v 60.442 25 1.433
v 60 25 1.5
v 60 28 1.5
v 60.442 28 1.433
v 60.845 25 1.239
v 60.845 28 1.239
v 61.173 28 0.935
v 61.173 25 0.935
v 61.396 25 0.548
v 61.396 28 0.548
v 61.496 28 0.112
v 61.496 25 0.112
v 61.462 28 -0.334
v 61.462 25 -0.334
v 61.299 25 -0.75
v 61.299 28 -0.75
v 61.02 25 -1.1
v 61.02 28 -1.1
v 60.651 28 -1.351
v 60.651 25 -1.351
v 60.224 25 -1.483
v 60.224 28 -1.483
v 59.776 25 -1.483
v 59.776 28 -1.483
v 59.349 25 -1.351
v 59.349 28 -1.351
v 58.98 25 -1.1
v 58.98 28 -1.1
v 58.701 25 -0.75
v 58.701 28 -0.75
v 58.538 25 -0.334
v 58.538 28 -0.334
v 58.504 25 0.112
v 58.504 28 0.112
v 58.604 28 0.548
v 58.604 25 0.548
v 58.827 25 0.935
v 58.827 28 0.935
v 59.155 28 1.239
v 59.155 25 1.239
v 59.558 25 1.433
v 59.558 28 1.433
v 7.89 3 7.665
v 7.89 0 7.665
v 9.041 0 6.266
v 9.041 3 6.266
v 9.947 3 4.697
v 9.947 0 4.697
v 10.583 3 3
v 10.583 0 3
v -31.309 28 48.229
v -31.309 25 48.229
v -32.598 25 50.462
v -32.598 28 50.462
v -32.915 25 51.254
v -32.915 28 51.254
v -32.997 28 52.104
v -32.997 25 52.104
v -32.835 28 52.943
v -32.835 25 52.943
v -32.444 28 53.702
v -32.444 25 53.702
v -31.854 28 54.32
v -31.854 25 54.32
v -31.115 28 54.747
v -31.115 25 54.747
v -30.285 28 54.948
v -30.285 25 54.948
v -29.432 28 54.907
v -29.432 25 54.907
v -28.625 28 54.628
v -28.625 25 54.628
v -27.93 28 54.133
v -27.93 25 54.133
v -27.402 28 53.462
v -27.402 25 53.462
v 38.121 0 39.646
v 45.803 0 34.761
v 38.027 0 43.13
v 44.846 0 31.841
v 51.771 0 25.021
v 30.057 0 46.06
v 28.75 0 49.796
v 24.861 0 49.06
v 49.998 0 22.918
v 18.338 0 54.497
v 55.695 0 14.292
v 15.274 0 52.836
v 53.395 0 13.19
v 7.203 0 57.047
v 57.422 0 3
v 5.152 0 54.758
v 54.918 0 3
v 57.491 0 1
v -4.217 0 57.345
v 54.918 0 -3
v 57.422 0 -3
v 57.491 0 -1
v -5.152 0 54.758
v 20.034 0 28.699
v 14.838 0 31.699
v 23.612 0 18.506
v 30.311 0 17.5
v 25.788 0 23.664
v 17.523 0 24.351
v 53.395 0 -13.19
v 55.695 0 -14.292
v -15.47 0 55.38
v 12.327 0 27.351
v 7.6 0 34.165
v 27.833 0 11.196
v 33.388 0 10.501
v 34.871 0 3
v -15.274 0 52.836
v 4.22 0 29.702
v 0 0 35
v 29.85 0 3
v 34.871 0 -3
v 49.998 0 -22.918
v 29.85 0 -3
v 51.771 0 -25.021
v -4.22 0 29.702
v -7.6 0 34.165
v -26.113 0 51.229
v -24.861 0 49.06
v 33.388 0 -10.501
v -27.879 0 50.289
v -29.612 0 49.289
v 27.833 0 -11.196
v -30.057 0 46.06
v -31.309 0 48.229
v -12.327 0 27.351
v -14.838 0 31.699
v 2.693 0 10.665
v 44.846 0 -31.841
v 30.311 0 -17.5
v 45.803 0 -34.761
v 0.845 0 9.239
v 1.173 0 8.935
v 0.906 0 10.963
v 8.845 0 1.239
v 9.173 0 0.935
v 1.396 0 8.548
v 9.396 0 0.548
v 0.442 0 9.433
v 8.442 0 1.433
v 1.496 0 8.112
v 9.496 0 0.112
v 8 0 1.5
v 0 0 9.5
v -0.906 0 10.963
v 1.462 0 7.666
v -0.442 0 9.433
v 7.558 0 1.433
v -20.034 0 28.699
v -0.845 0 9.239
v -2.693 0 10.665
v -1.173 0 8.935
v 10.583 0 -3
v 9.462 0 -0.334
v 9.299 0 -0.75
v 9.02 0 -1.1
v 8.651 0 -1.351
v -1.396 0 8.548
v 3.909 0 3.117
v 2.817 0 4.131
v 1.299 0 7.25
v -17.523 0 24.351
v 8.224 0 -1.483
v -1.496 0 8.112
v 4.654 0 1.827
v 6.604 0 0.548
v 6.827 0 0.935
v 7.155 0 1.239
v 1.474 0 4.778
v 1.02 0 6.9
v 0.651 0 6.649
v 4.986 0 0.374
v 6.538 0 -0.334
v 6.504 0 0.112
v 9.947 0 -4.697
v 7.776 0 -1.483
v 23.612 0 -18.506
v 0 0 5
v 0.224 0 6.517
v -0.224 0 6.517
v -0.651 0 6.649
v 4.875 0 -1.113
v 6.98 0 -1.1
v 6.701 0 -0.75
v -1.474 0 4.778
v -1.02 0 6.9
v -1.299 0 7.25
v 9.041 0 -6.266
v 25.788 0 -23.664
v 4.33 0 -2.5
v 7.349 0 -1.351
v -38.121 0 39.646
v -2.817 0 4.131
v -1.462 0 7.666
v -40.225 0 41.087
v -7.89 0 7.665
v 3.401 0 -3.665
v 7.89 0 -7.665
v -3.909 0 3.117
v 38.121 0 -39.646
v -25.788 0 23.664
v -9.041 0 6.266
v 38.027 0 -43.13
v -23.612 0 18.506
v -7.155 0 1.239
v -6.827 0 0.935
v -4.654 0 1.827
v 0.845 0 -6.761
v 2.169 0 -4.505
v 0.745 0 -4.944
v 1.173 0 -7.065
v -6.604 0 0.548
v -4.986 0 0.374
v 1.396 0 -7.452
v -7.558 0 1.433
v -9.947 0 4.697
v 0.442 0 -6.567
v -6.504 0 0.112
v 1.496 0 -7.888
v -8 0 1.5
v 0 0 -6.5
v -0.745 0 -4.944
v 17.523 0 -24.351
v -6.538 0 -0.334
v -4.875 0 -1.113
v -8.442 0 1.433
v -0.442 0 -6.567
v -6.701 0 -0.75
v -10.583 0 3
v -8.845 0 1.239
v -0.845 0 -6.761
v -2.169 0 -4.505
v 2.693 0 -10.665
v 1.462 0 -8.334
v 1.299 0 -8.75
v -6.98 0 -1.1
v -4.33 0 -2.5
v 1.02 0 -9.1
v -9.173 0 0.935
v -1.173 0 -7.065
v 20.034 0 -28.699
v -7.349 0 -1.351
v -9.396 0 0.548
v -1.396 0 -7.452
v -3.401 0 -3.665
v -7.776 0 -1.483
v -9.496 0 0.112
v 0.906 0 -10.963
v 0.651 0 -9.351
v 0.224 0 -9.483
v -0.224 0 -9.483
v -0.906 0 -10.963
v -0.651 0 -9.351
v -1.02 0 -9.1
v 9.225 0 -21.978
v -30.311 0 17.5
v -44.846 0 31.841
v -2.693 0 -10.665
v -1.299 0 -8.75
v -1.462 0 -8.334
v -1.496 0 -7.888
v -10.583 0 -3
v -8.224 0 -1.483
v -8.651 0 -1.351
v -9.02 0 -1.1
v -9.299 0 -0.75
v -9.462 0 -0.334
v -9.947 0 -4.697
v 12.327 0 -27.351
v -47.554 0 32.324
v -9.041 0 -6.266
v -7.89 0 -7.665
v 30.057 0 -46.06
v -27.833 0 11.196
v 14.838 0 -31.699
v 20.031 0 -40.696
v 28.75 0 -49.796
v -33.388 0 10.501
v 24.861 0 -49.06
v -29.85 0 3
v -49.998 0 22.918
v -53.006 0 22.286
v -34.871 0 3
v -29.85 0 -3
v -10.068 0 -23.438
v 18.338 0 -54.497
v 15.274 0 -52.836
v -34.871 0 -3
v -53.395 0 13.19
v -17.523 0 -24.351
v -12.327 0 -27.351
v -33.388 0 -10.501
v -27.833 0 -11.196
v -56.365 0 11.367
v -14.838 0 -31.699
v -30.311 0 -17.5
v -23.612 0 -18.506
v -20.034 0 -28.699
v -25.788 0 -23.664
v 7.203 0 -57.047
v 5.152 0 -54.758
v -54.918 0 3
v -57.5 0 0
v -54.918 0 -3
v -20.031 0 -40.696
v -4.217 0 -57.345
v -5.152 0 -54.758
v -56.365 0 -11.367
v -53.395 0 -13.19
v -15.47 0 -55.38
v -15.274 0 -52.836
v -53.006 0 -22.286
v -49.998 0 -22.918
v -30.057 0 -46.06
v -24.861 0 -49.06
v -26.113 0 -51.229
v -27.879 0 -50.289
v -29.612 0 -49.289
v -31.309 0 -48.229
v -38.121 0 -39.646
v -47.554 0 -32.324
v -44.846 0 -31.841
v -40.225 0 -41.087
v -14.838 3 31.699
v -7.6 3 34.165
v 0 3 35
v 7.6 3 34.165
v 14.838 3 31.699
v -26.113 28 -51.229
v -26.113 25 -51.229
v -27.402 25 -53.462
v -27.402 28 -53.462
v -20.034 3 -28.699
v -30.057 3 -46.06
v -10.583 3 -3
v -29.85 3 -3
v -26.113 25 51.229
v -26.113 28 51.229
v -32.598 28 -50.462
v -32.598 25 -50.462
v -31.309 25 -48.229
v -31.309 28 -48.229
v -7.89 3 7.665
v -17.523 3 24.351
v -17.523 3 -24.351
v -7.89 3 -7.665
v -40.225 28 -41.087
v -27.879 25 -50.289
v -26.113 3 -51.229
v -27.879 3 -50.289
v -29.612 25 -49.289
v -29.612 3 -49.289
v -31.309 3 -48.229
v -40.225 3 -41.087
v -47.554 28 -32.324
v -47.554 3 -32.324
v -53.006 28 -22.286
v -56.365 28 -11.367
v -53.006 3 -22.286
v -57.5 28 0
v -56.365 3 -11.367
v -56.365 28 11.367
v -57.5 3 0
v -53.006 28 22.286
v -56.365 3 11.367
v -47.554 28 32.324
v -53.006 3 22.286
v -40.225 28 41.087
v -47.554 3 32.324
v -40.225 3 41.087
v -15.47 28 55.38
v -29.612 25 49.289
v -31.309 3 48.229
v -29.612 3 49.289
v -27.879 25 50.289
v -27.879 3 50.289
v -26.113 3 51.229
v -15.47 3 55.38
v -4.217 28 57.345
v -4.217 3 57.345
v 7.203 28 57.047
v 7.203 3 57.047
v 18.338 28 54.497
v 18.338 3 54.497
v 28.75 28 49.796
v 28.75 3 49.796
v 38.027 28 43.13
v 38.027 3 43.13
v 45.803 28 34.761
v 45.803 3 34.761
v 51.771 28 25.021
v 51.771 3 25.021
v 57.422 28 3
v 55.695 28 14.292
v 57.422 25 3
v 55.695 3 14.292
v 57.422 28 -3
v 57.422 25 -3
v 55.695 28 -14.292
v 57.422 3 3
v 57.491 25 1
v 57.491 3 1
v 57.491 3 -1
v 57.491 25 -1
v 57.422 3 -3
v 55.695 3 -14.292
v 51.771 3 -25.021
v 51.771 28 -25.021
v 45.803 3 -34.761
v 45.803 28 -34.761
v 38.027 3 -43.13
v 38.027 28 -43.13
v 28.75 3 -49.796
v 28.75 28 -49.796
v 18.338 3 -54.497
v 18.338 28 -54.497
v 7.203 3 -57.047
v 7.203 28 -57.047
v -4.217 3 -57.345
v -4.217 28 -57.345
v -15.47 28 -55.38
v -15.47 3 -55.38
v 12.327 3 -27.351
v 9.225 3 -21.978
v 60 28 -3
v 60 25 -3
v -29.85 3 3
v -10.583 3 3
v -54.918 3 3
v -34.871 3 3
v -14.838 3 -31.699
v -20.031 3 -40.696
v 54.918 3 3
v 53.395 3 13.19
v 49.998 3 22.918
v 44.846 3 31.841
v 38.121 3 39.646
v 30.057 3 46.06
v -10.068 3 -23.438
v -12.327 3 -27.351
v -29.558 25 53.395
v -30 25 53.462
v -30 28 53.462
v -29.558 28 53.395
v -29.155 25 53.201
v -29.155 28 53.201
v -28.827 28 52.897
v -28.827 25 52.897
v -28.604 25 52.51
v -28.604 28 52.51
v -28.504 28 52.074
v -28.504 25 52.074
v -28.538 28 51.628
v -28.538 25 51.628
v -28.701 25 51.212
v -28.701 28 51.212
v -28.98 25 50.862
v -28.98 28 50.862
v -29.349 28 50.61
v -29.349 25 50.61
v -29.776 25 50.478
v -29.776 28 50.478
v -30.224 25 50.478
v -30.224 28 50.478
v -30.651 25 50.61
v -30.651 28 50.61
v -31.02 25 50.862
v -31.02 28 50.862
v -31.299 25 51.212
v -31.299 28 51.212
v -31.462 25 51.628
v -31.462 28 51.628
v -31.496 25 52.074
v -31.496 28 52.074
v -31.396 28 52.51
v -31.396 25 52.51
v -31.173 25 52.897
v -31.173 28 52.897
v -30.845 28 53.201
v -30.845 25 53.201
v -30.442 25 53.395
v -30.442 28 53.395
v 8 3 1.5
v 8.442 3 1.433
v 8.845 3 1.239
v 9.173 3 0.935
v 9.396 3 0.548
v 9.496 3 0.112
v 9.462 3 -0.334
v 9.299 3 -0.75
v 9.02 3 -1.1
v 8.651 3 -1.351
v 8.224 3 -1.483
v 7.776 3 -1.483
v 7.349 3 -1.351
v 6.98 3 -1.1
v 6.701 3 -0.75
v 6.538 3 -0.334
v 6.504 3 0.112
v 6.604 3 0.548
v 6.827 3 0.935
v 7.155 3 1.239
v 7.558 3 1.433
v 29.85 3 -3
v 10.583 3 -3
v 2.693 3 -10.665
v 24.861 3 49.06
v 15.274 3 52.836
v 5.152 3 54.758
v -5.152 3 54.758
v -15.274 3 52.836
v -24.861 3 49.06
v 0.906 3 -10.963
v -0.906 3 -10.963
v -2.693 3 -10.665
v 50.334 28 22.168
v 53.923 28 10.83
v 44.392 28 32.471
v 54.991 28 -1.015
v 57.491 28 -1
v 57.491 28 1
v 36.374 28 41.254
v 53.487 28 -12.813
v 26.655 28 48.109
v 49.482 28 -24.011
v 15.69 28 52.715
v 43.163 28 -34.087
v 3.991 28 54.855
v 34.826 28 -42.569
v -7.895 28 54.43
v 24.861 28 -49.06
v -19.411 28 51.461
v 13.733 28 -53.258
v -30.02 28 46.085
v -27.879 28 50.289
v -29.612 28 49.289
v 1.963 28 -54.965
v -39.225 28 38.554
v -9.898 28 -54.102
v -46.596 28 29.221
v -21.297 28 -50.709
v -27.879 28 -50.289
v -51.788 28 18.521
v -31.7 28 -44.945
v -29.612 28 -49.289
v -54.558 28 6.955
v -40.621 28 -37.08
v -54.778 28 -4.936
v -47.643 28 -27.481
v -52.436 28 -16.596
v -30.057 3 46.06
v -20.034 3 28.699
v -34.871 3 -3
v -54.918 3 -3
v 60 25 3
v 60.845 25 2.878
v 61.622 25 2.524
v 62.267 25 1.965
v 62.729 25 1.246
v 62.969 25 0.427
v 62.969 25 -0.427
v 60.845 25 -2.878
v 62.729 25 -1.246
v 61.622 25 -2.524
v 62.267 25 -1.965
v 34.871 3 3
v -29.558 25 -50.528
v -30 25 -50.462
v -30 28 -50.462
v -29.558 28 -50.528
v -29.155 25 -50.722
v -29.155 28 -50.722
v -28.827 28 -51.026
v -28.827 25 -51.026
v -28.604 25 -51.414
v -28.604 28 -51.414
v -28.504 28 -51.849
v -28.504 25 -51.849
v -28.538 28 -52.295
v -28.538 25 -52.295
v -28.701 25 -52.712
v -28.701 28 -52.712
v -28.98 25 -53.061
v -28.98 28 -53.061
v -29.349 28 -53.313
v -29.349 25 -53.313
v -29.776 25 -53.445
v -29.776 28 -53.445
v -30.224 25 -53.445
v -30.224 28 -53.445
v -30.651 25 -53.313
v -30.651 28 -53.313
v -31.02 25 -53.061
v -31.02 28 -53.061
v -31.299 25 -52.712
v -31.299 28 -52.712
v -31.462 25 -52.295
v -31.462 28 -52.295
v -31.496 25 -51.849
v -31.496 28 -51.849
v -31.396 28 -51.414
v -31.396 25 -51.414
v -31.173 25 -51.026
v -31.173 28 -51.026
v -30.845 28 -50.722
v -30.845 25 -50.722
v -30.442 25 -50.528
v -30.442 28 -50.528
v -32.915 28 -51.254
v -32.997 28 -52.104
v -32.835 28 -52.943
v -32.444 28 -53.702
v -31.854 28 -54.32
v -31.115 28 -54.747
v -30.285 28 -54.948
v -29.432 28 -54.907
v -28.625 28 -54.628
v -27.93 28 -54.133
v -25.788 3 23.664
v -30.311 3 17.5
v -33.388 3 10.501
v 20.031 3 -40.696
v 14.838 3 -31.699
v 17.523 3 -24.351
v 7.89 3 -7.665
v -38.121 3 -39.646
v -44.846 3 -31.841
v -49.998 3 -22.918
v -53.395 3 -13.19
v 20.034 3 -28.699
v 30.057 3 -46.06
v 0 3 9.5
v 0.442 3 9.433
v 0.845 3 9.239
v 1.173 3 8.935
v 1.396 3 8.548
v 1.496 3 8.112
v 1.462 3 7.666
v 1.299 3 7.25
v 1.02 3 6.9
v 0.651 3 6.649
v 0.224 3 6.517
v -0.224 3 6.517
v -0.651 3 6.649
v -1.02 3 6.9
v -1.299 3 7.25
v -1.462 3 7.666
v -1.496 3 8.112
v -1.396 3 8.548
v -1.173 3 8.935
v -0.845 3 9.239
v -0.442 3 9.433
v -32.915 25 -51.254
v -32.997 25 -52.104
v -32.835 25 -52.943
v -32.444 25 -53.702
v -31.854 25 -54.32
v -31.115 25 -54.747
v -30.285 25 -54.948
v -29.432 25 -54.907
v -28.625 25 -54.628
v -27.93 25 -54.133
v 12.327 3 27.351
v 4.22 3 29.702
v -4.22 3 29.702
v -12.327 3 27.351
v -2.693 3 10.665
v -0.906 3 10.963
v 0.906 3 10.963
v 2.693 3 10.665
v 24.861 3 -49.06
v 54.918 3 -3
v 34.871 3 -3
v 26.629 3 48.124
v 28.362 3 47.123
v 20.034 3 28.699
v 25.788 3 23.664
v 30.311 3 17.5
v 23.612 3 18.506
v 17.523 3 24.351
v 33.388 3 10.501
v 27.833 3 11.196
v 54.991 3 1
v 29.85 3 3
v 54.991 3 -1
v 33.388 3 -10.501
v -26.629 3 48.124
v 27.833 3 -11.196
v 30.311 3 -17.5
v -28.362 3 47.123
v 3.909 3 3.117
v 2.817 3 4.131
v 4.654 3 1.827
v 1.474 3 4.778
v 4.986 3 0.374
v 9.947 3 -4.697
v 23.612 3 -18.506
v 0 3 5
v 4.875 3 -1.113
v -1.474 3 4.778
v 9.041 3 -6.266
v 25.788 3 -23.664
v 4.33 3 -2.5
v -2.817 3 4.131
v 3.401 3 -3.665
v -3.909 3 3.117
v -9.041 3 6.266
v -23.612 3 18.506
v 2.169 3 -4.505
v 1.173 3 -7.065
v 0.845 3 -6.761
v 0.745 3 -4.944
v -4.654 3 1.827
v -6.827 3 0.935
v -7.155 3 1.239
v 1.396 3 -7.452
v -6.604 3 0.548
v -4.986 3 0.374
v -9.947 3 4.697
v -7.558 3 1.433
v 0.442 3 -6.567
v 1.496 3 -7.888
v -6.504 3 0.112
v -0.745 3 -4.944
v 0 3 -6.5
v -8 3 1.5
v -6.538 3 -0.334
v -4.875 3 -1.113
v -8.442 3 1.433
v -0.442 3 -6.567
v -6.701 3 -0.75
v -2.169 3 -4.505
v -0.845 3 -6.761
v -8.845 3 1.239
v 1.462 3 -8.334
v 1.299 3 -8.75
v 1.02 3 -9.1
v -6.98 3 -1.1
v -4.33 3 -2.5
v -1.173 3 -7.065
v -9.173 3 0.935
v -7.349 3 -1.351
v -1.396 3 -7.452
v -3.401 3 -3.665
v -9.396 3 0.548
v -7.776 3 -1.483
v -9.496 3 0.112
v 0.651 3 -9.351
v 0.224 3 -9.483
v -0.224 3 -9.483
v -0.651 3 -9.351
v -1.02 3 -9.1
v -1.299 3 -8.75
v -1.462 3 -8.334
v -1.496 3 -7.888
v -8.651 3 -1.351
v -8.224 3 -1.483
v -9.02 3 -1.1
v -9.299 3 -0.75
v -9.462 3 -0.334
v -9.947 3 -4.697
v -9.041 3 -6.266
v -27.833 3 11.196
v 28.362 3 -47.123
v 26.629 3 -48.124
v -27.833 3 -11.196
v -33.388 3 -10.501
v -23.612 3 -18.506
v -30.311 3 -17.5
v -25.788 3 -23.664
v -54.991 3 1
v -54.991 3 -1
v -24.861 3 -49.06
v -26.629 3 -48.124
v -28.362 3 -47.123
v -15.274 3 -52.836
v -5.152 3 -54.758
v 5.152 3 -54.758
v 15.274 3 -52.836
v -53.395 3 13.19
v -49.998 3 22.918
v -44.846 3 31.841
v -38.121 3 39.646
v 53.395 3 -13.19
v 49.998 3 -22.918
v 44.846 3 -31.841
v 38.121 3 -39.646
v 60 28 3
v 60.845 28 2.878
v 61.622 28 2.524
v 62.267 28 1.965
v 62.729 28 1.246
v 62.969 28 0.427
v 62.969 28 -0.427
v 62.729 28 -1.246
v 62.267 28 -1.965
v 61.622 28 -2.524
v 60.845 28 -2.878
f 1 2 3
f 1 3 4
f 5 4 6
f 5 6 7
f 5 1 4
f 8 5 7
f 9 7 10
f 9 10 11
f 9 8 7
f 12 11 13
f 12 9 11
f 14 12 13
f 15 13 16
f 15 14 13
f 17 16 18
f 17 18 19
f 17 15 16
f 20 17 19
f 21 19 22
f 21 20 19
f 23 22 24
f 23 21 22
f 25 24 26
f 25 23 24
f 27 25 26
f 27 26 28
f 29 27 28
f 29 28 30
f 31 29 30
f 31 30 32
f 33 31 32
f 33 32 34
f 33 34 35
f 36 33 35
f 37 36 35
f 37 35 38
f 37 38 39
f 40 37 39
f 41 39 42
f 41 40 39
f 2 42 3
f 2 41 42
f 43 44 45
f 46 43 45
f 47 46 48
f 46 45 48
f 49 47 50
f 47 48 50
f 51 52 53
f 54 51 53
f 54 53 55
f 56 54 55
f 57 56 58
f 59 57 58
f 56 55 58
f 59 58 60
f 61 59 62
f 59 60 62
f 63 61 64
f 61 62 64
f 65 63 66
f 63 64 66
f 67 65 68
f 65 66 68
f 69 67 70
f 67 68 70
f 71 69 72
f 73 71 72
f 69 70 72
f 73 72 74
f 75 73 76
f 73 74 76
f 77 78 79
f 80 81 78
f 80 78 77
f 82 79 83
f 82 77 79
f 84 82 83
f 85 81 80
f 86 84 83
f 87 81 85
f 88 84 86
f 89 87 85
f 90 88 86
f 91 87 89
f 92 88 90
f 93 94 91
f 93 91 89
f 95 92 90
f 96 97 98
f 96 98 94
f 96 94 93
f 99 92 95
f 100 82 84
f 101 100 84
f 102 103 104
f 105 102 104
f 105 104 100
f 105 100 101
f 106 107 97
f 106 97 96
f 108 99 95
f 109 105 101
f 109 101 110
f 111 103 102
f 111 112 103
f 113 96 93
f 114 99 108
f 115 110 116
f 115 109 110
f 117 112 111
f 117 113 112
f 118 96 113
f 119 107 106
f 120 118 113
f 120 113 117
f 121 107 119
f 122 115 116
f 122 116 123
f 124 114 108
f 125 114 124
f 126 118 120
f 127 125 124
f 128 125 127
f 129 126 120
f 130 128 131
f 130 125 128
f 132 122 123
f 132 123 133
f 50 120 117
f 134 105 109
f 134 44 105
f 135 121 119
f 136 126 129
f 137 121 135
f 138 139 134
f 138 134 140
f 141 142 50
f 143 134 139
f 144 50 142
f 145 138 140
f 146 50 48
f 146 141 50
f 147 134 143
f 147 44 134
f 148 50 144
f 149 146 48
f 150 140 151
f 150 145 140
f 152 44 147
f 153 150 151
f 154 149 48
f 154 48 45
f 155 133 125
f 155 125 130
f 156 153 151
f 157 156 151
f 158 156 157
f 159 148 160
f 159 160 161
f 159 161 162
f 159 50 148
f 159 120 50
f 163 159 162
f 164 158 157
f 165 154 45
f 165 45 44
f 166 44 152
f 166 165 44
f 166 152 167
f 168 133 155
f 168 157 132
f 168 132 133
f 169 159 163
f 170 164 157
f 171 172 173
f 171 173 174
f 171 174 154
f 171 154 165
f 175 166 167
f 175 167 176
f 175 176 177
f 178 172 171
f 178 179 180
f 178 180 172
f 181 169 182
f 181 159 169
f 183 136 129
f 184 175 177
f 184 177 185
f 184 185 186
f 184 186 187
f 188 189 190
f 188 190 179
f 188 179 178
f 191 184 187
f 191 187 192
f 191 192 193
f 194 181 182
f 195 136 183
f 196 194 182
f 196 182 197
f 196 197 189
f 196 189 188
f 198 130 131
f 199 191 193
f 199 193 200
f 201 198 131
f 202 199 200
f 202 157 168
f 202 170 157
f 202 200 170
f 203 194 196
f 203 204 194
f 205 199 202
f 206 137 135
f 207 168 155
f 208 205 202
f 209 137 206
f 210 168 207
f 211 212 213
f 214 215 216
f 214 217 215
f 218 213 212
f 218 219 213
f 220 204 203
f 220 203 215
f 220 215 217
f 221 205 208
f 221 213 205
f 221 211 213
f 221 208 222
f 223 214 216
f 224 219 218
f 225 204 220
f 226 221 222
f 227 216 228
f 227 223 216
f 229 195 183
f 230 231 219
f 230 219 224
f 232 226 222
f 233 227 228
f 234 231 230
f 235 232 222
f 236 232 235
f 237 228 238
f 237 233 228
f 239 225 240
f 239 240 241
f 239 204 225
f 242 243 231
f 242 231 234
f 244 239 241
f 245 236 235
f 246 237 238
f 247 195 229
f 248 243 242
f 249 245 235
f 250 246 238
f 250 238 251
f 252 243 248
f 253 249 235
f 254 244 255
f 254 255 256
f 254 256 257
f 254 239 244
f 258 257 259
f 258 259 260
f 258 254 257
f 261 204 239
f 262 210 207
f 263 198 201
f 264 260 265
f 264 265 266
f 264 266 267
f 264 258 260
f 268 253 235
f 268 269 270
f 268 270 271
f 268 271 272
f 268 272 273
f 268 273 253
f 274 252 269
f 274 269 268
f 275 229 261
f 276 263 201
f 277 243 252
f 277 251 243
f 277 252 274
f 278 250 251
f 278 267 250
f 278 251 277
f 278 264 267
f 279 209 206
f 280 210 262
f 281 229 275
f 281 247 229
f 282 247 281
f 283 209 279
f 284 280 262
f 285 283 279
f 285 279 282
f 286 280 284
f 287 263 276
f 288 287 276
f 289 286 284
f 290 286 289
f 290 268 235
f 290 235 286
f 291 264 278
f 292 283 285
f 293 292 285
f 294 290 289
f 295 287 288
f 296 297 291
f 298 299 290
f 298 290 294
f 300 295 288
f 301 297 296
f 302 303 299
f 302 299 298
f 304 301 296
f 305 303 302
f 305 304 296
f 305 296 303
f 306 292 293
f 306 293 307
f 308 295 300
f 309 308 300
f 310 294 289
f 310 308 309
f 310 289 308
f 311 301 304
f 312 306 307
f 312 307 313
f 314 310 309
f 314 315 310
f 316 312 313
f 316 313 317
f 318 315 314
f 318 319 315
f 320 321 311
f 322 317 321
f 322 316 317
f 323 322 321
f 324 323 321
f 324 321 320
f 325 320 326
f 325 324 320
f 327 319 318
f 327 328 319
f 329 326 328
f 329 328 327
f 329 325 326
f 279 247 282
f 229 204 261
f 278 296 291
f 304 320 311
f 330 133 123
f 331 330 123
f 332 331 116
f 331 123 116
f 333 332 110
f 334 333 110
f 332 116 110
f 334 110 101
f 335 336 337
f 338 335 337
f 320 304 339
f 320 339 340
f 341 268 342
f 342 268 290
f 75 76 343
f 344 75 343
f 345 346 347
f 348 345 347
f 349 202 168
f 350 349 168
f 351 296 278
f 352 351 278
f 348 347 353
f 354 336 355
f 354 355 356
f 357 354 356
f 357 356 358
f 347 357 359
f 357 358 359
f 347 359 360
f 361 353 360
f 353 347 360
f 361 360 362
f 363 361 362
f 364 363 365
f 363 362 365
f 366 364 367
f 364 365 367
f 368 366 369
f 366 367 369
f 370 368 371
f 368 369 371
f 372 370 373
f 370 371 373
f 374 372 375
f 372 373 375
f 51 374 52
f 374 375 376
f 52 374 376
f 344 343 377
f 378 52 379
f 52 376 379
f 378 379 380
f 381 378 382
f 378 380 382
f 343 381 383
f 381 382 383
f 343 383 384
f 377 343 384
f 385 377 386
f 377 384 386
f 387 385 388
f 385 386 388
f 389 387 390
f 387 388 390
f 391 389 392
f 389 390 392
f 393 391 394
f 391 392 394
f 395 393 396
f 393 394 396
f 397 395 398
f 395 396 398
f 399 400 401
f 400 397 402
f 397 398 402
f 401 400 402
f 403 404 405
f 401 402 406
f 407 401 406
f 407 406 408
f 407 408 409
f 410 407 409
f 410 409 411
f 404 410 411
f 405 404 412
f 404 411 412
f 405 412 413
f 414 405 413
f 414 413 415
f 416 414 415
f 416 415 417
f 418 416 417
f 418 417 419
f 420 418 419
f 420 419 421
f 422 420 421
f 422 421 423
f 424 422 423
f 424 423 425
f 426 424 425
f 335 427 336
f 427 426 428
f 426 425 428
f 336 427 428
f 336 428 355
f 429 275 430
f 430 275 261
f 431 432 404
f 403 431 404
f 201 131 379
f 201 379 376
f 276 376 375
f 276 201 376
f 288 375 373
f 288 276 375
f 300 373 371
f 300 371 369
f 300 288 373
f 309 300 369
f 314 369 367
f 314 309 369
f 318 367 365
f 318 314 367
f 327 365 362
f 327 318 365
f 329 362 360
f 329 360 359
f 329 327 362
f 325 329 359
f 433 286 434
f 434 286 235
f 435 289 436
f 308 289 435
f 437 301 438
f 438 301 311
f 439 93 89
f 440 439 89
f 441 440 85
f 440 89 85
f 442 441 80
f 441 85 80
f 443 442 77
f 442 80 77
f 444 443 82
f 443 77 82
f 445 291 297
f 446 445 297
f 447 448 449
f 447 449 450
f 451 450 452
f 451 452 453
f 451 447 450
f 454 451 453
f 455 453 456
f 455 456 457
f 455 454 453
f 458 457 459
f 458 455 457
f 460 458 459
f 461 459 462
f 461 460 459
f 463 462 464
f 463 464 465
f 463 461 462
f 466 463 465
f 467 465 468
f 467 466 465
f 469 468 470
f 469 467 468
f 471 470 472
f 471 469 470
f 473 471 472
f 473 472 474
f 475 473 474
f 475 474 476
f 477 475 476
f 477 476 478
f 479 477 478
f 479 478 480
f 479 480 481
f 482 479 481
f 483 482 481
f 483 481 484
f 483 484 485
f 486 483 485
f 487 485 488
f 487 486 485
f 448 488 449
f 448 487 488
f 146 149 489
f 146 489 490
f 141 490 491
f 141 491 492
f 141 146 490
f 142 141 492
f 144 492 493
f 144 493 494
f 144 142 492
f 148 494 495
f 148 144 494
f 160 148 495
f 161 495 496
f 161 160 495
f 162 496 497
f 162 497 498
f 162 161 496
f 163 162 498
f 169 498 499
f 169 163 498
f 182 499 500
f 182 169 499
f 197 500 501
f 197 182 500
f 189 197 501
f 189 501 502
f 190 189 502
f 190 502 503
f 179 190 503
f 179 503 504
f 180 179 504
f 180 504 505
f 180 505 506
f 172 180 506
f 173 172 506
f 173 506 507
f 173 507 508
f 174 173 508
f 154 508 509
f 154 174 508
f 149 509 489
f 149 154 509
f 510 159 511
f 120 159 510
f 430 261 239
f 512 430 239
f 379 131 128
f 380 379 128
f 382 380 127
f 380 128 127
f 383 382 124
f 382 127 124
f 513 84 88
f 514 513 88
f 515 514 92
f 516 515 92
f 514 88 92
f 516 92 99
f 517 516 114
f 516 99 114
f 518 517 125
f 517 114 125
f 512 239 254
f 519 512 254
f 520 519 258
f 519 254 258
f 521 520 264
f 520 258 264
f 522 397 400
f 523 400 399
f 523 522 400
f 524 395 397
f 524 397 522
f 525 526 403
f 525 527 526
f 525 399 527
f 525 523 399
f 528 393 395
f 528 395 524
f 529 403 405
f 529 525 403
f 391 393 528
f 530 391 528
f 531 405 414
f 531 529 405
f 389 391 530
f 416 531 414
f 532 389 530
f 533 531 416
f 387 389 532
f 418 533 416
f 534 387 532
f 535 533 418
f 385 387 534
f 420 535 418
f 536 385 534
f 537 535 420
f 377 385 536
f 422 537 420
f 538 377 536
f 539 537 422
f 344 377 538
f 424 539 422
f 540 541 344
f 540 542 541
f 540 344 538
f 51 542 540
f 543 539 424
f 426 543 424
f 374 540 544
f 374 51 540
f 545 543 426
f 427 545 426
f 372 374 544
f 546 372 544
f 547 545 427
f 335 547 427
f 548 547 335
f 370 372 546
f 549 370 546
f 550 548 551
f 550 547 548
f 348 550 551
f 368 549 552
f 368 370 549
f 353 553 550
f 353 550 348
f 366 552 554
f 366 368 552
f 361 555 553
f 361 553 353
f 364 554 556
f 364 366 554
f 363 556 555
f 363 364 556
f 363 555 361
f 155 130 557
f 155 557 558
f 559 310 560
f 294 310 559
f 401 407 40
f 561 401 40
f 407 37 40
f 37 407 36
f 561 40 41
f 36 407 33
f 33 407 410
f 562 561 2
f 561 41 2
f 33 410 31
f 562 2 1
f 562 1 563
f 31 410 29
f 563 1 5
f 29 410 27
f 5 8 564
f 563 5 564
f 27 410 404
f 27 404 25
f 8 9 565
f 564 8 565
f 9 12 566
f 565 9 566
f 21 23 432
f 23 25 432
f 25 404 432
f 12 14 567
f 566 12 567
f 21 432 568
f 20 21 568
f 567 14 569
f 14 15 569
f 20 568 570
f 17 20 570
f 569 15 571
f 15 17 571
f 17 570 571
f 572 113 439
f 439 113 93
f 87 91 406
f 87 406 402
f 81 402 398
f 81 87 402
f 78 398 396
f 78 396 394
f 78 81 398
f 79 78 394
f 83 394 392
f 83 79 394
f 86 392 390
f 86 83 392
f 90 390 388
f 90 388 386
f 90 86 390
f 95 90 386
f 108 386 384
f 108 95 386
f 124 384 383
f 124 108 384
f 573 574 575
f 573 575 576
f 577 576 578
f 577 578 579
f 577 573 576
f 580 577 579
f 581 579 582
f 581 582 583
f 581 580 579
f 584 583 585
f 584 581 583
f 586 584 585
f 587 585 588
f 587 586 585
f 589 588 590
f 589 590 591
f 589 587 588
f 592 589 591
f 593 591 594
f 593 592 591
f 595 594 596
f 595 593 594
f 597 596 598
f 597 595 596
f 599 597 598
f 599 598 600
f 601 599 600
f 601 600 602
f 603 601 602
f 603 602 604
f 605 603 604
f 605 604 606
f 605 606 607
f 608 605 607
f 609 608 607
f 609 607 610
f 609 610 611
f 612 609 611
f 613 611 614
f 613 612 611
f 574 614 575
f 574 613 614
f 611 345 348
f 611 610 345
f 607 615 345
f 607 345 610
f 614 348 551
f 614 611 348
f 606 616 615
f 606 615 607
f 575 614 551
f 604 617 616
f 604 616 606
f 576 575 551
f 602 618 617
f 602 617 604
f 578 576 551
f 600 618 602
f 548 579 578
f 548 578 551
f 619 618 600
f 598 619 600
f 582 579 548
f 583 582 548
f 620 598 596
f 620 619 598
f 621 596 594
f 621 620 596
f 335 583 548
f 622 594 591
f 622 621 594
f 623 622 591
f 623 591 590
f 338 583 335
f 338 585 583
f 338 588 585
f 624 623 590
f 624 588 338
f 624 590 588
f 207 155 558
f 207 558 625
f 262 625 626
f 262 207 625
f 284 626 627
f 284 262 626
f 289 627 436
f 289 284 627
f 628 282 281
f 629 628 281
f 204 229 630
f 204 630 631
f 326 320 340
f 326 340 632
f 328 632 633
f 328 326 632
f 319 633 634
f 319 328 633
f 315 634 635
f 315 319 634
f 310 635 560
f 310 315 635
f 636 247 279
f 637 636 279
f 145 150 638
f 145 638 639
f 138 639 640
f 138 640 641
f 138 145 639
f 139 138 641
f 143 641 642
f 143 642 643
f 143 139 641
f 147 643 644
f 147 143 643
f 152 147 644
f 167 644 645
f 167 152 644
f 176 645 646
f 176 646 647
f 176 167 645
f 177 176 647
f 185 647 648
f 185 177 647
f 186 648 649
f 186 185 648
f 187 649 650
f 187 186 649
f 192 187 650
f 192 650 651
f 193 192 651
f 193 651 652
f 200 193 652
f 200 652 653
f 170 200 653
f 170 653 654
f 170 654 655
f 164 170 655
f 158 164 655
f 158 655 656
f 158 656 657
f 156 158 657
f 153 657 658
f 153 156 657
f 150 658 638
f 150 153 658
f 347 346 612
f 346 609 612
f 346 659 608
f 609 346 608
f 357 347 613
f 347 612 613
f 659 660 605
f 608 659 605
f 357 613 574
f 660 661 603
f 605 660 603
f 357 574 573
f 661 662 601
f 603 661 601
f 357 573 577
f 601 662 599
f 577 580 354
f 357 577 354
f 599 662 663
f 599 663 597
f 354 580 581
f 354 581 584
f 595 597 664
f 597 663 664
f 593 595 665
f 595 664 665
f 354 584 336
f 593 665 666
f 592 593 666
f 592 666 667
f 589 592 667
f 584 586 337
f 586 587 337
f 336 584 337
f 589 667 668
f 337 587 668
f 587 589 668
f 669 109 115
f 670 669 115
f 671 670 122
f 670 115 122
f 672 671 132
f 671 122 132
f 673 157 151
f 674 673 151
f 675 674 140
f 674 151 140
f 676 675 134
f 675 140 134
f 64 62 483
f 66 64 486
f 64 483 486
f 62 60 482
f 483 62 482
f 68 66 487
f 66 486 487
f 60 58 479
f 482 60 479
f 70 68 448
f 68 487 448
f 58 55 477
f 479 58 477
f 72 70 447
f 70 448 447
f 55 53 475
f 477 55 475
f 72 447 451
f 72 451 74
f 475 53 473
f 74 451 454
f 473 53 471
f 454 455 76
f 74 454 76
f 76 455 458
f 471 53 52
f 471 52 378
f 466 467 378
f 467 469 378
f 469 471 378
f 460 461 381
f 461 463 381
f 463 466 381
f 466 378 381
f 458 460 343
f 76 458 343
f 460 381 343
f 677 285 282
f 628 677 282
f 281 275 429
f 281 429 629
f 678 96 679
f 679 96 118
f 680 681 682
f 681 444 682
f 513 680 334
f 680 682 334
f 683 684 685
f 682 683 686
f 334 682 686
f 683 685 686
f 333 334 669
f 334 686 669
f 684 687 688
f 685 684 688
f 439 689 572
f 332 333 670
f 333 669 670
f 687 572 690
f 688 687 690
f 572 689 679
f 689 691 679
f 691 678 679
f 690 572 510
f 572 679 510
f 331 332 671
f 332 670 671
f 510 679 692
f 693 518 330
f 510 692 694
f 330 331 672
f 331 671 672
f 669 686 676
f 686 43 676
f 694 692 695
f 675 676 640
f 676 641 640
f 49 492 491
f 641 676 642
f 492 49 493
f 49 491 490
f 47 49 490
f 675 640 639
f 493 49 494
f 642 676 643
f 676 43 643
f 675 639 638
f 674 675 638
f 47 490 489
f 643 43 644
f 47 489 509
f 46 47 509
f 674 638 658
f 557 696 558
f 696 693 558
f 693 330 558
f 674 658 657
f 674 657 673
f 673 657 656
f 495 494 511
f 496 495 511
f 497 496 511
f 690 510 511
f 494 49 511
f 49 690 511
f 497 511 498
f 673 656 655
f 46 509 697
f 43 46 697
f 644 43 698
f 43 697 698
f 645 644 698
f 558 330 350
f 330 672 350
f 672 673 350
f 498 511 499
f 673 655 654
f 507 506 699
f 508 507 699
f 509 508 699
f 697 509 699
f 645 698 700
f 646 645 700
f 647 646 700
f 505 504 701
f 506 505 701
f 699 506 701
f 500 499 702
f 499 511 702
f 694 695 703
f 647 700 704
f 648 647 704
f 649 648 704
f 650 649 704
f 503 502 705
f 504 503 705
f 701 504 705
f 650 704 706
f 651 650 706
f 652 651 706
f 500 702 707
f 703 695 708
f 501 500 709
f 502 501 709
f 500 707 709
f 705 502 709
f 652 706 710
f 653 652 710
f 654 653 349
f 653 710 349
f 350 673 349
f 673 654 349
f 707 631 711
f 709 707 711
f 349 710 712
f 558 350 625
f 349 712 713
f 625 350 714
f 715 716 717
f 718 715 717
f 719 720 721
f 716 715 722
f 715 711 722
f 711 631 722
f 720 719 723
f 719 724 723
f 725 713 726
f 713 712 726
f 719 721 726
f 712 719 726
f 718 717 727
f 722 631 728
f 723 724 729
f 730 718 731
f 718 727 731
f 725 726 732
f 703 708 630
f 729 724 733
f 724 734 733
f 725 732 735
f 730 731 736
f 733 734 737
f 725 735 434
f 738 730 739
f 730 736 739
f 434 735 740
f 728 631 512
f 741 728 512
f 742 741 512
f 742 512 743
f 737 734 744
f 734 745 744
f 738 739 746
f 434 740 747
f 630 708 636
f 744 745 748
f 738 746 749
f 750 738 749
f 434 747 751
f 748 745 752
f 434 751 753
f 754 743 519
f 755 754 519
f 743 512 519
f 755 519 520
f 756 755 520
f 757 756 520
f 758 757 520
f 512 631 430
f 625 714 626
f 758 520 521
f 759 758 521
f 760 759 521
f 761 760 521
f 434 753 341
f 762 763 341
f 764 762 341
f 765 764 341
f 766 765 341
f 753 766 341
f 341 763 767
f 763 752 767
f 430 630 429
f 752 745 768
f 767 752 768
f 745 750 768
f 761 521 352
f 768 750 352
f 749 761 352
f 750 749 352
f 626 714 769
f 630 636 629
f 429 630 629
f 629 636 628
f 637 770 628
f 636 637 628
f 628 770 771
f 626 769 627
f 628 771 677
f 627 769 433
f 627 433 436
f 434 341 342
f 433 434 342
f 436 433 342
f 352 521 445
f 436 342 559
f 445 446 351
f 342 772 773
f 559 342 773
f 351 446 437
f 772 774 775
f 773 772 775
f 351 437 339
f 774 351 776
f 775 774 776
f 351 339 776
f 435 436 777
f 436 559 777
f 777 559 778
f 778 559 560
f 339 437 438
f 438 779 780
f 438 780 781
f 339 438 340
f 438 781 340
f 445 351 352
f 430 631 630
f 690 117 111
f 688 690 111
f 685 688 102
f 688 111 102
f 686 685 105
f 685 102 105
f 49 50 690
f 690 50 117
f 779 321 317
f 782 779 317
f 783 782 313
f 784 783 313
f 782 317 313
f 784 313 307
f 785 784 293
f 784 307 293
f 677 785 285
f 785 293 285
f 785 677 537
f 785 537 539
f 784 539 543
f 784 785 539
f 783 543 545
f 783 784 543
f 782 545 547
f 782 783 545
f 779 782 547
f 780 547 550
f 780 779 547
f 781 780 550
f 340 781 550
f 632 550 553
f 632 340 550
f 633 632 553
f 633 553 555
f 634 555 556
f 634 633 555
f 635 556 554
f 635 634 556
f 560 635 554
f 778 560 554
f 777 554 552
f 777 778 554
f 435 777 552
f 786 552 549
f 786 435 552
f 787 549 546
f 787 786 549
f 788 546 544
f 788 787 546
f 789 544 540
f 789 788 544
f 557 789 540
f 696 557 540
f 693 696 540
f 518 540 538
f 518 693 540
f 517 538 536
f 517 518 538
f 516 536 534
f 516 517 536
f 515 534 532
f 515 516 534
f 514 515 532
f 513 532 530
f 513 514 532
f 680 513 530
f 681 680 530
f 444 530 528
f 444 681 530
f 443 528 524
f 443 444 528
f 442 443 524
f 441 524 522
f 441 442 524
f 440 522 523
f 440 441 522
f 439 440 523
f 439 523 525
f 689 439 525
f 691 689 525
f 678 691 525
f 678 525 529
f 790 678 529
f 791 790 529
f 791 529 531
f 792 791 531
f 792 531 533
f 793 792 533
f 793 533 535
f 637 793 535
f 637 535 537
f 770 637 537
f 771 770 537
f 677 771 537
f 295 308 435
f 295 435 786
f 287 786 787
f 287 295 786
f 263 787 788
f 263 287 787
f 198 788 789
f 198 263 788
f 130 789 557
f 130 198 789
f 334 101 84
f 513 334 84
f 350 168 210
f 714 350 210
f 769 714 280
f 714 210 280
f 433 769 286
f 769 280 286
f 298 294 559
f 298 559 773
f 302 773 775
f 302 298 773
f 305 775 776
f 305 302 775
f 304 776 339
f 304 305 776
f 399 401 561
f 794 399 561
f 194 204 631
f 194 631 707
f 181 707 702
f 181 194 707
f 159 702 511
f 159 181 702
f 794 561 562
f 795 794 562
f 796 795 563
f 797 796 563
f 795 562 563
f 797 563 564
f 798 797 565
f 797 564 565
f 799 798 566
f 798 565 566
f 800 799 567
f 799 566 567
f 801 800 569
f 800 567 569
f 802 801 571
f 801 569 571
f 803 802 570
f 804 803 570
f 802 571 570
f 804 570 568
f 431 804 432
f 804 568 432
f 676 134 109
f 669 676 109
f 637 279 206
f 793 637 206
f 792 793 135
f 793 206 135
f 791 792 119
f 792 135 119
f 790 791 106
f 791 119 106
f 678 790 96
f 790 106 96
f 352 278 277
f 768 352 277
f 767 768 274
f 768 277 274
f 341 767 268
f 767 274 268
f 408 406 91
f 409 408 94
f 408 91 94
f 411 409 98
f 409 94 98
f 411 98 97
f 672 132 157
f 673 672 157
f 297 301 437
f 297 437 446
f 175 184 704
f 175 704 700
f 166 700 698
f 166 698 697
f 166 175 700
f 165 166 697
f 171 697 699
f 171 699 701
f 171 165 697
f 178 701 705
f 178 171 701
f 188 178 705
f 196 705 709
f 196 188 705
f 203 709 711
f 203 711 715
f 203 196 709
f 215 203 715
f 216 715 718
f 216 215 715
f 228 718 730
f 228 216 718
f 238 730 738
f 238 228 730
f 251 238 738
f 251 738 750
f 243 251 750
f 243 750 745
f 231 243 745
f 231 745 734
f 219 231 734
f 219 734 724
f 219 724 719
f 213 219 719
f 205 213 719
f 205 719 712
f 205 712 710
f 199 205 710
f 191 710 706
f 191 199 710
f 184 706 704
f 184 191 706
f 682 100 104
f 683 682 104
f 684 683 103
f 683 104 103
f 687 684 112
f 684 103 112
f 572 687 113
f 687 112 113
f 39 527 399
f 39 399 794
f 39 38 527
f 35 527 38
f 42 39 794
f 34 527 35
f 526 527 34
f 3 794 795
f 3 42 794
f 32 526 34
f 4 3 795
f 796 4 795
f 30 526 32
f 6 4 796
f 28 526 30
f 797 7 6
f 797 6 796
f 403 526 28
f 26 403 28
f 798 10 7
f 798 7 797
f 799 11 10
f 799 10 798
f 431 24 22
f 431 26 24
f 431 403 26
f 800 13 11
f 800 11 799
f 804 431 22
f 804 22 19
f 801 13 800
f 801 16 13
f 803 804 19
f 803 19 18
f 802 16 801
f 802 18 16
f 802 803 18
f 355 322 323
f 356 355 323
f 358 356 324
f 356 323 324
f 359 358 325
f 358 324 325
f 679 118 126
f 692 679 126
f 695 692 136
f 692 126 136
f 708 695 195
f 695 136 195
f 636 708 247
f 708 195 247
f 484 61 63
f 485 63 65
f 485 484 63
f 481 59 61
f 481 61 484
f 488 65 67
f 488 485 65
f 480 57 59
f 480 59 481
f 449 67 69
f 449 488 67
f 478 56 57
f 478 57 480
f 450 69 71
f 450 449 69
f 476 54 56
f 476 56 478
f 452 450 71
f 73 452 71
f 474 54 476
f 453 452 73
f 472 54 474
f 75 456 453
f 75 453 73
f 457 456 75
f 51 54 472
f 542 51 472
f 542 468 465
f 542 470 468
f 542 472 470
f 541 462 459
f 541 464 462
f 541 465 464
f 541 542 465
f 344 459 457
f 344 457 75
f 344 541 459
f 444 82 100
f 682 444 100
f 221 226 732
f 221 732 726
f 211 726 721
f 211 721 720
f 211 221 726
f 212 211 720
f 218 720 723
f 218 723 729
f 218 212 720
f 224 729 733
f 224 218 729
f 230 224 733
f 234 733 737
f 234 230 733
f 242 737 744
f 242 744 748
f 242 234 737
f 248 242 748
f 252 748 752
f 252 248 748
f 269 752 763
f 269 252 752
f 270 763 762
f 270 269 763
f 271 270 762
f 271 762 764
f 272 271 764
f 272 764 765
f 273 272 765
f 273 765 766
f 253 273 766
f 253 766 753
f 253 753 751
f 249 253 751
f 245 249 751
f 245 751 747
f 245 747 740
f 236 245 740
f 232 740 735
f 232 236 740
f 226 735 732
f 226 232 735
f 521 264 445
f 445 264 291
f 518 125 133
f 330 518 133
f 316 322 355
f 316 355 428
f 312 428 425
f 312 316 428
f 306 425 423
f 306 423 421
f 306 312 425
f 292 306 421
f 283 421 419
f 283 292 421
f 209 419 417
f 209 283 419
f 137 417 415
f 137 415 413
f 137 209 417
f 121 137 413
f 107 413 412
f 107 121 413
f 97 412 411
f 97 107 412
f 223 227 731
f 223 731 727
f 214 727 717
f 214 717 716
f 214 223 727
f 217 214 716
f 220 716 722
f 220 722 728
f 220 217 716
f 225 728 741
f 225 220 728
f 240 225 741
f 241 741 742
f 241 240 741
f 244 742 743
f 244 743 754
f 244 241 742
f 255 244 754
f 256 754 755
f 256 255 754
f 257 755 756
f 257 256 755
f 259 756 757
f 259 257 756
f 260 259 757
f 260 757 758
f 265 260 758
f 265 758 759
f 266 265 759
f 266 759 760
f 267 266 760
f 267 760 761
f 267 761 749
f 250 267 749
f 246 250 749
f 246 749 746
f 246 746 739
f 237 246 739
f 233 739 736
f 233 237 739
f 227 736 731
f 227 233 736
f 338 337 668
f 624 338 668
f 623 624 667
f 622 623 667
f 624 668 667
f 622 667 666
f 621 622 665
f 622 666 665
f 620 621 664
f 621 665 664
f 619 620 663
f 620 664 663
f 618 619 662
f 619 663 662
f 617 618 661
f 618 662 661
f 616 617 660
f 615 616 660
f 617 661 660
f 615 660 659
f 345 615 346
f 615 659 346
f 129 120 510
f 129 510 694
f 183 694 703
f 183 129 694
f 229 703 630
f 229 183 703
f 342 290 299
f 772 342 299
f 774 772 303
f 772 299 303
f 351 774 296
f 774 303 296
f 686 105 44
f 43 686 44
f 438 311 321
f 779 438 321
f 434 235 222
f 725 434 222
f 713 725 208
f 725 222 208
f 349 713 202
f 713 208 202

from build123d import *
from build123d.topology import SkipClean

# Parameters (mm, degrees)
SKETCH_1_R          = 1.5
SKETCH_1_R_2        = 5
EXTRUDE_1_DEPTH     = 3
SKETCH_2_R          = 57.5
SKETCH_2_R_2        = 55
EXTRUDE_2_DEPTH     = 25
EXTRUDE_START       = -3
SKETCH_3_R          = 1.5
EXTRUDE_3_DEPTH     = 3
CUT_EXTRUDE_START   = -30
SKETCH_4_R          = 69.475087651
SKETCH_4_R_2        = 57.5
CUT_EXTRUDE_1_DEPTH = 30
CUT_EXTRUDE_2_DEPTH = 10


with BuildPart() as part:
    # 草图1 → 凸台-拉伸1 (new body)
    with BuildSketch(Plane(origin=(0, 0, 0), x_dir=(1, 0, 0), z_dir=(0, 1, 0))):
        with BuildLine():
            Line((57.421685799, 3), (60, 3))
            ThreePointArc((60, 3), (63, 0), (60, -3))
            Line((60, -3), (57.421685799, -3))
            ThreePointArc((57.421685799, -3), (28.75, -49.796460718), (-26.112766688, -51.22863863))
            Line((-26.112766688, -51.22863863), (-27.401923789, -53.461524227))
            ThreePointArc((-27.401923789, -53.461524227), (-31.5, -54.559600438), (-32.598076211, -50.461524227))
            Line((-32.598076211, -50.461524227), (-31.308919111, -48.22863863))
            ThreePointArc((-31.308919111, -48.22863863), (-57.5, 0), (-31.308919111, 48.22863863))
            Line((-31.308919111, 48.22863863), (-32.598076211, 50.461524227))
            ThreePointArc((-32.598076211, 50.461524227), (-31.5, 54.559600438), (-27.401923789, 53.461524227))
            Line((-27.401923789, 53.461524227), (-26.112766688, 51.22863863))
            ThreePointArc((-26.112766688, 51.22863863), (28.75, 49.796460718), (57.421685799, 3))
        make_face()
        with Locations((0, 8)):
            Circle(SKETCH_1_R, mode=Mode.SUBTRACT)
        with Locations((8, 0)):
            Circle(SKETCH_1_R, mode=Mode.SUBTRACT)
        with Locations((0, -8)):
            Circle(SKETCH_1_R, mode=Mode.SUBTRACT)
        with Locations((-8, 0)):
            Circle(SKETCH_1_R, mode=Mode.SUBTRACT)
        Circle(SKETCH_1_R_2, mode=Mode.SUBTRACT)
        with Locations((60, 0)):
            Circle(SKETCH_1_R, mode=Mode.SUBTRACT)
        with Locations((-30, -51.961524227)):
            Circle(SKETCH_1_R, mode=Mode.SUBTRACT)
        with Locations((-30, 51.961524227)):
            Circle(SKETCH_1_R, mode=Mode.SUBTRACT)
        with BuildLine():
            Line((10.583005244, 3), (29.849623113, 3))
            ThreePointArc((29.849623113, 3), (25.980762114, 15), (17.522887768, 24.350531909))
            Line((17.522887768, 24.350531909), (7.889578833, 7.66515139))
            ThreePointArc((7.889578833, 7.66515139), (9.526279442, 5.5), (10.583005244, 3))
        make_face(mode=Mode.SUBTRACT)
        with BuildLine():
            Line((10.583005244, -3), (29.849623113, -3))
            ThreePointArc((29.849623113, -3), (25.980762114, -15), (17.522887768, -24.350531909))
            Line((17.522887768, -24.350531909), (7.889578833, -7.66515139))
            ThreePointArc((7.889578833, -7.66515139), (9.526279442, -5.5), (10.583005244, -3))
        make_face(mode=Mode.SUBTRACT)
        with BuildLine():
            Line((2.693426411, -10.66515139), (12.326735345, -27.350531909))
            ThreePointArc((12.326735345, -27.350531909), (0, -30), (-12.326735345, -27.350531909))
            Line((-12.326735345, -27.350531909), (-2.693426411, -10.66515139))
            ThreePointArc((-2.693426411, -10.66515139), (0, -11), (2.693426411, -10.66515139))
        make_face(mode=Mode.SUBTRACT)
        with BuildLine():
            Line((-14.837519563, 31.699337741), (-24.860984224, 49.060487802))
            ThreePointArc((-24.860984224, 49.060487802), (0, 55), (24.860984224, 49.060487802))
            Line((24.860984224, 49.060487802), (14.837519563, 31.699337741))
            ThreePointArc((14.837519563, 31.699337741), (0, 35), (-14.837519563, 31.699337741))
        make_face(mode=Mode.SUBTRACT)
        with BuildLine():
            Line((-7.889578833, -7.66515139), (-17.522887768, -24.350531909))
            ThreePointArc((-17.522887768, -24.350531909), (-25.980762114, -15), (-29.849623113, -3))
            Line((-29.849623113, -3), (-10.583005244, -3))
            ThreePointArc((-10.583005244, -3), (-9.526279442, -5.5), (-7.889578833, -7.66515139))
        make_face(mode=Mode.SUBTRACT)
        with BuildLine():
            Line((-10.583005244, 3), (-29.849623113, 3))
            ThreePointArc((-29.849623113, 3), (-25.980762114, 15), (-17.522887768, 24.350531909))
            Line((-17.522887768, 24.350531909), (-7.889578833, 7.66515139))
            ThreePointArc((-7.889578833, 7.66515139), (-9.526279442, 5.5), (-10.583005244, 3))
        make_face(mode=Mode.SUBTRACT)
        with BuildLine():
            Line((20.033671986, 28.699337741), (30.057136647, 46.060487802))
            ThreePointArc((30.057136647, 46.060487802), (47.631397208, 27.5), (54.918120871, 3))
            Line((54.918120871, 3), (34.871191548, 3))
            ThreePointArc((34.871191548, 3), (30.310889132, 17.5), (20.033671986, 28.699337741))
        make_face(mode=Mode.SUBTRACT)
        with BuildLine():
            Line((-20.033671986, 28.699337741), (-30.057136647, 46.060487802))
            ThreePointArc((-30.057136647, 46.060487802), (-47.631397208, 27.5), (-54.918120871, 3))
            Line((-54.918120871, 3), (-34.871191548, 3))
            ThreePointArc((-34.871191548, 3), (-30.310889132, 17.5), (-20.033671986, 28.699337741))
        make_face(mode=Mode.SUBTRACT)
        with BuildLine():
            Line((-2.693426411, 10.66515139), (-12.326735345, 27.350531909))
            ThreePointArc((-12.326735345, 27.350531909), (0, 30), (12.326735345, 27.350531909))
            Line((12.326735345, 27.350531909), (2.693426411, 10.66515139))
            ThreePointArc((2.693426411, 10.66515139), (0, 11), (-2.693426411, 10.66515139))
        make_face(mode=Mode.SUBTRACT)
        with BuildLine():
            Line((-34.871191548, -3), (-54.918120871, -3))
            ThreePointArc((-54.918120871, -3), (-47.631397208, -27.5), (-30.057136647, -46.060487802))
            Line((-30.057136647, -46.060487802), (-20.033671986, -28.699337741))
            ThreePointArc((-20.033671986, -28.699337741), (-30.310889132, -17.5), (-34.871191548, -3))
        make_face(mode=Mode.SUBTRACT)
        with BuildLine():
            Line((34.871191548, -3), (54.918120871, -3))
            ThreePointArc((54.918120871, -3), (47.631397208, -27.5), (30.057136647, -46.060487802))
            Line((30.057136647, -46.060487802), (20.033671986, -28.699337741))
            ThreePointArc((20.033671986, -28.699337741), (30.310889132, -17.5), (34.871191548, -3))
        make_face(mode=Mode.SUBTRACT)
        with BuildLine():
            Line((14.837519563, -31.699337741), (24.860984224, -49.060487802))
            ThreePointArc((24.860984224, -49.060487802), (0, -55), (-24.860984224, -49.060487802))
            Line((-24.860984224, -49.060487802), (-14.837519563, -31.699337741))
            ThreePointArc((-14.837519563, -31.699337741), (0, -35), (14.837519563, -31.699337741))
        make_face(mode=Mode.SUBTRACT)
    extrude(amount=EXTRUDE_1_DEPTH)

    # 草图2 → 凸台-拉伸2 (add)
    with SkipClean():  # the faces are left unmerged after this step: merging them gives an invalid solid
        with BuildSketch(Plane(origin=(0, 3, 0), x_dir=(1, 0, 0), z_dir=(0, 1, 0))):
            Circle(SKETCH_2_R)
            Circle(SKETCH_2_R_2, mode=Mode.SUBTRACT)
        extrude(amount=EXTRUDE_2_DEPTH)
    add(part.part.scale(1), mode=Mode.REPLACE)  # the faces are merged on a copy

    # 草图3 → 凸台-拉伸3 (add)
    # profile 1 of 3: a face of its own
    with SkipClean():  # the faces are left unmerged after this step: merging them gives an invalid solid
        with BuildSketch(Plane(origin=(0, 28, 0), x_dir=(1, 0, 0), z_dir=(0, 1, 0)).offset(EXTRUDE_START)):
            with BuildLine():
                Line((-32.598076211, 50.461524227), (-31.308919111, 48.22863863))
                ThreePointArc((-31.308919111, 48.22863863), (-28.75, 49.796460718), (-26.112766688, 51.22863863))
                Line((-26.112766688, 51.22863863), (-27.401923789, 53.461524227))
                ThreePointArc((-27.401923789, 53.461524227), (-31.5, 54.559600438), (-32.598076211, 50.461524227))
            make_face()
            with Locations((-30, 51.961524227)):
                Circle(SKETCH_3_R, mode=Mode.SUBTRACT)
        # profile 2 of 3: a face of its own
        with BuildSketch(Plane(origin=(0, 28, 0), x_dir=(1, 0, 0), z_dir=(0, 1, 0)).offset(EXTRUDE_START)):
            with BuildLine():
                Line((60, 3), (57.421685799, 3))
                ThreePointArc((57.421685799, 3), (57.5, 0), (57.421685799, -3))
                Line((57.421685799, -3), (60, -3))
                ThreePointArc((60, -3), (63, 0), (60, 3))
            make_face()
            with Locations((60, 0)):
                Circle(SKETCH_3_R, mode=Mode.SUBTRACT)
        # profile 3 of 3: a face of its own
        with BuildSketch(Plane(origin=(0, 28, 0), x_dir=(1, 0, 0), z_dir=(0, 1, 0)).offset(EXTRUDE_START)):
            with BuildLine():
                Line((-27.401923789, -53.461524227), (-26.112766688, -51.22863863))
                ThreePointArc((-26.112766688, -51.22863863), (-28.75, -49.796460718), (-31.308919111, -48.22863863))
                Line((-31.308919111, -48.22863863), (-32.598076211, -50.461524227))
                ThreePointArc((-32.598076211, -50.461524227), (-31.5, -54.559600438), (-27.401923789, -53.461524227))
            make_face()
            with Locations((-30, -51.961524227)):
                Circle(SKETCH_3_R, mode=Mode.SUBTRACT)
        extrude(amount=EXTRUDE_3_DEPTH)

    # 草图4 → 切除-拉伸1 (cut)
    with BuildSketch(Plane(origin=(0, 3, 0), x_dir=(1, 0, 0), z_dir=(0, 1, 0)).offset(CUT_EXTRUDE_START)):
        Circle(SKETCH_4_R)
        Circle(SKETCH_4_R_2, mode=Mode.SUBTRACT)
    extrude(amount=CUT_EXTRUDE_1_DEPTH, mode=Mode.SUBTRACT)

    # 草图5 → 切除-拉伸2 (cut)
    with BuildSketch(Plane.XZ):
        Polygon((-20.031496469, -40.695569636), (-10.067965636, -23.43822801), (9.224847601, -21.977904737), (20.031496469, -40.695569636), align=None)
    extrude(amount=-CUT_EXTRUDE_2_DEPTH, mode=Mode.SUBTRACT)


solid = part.part
